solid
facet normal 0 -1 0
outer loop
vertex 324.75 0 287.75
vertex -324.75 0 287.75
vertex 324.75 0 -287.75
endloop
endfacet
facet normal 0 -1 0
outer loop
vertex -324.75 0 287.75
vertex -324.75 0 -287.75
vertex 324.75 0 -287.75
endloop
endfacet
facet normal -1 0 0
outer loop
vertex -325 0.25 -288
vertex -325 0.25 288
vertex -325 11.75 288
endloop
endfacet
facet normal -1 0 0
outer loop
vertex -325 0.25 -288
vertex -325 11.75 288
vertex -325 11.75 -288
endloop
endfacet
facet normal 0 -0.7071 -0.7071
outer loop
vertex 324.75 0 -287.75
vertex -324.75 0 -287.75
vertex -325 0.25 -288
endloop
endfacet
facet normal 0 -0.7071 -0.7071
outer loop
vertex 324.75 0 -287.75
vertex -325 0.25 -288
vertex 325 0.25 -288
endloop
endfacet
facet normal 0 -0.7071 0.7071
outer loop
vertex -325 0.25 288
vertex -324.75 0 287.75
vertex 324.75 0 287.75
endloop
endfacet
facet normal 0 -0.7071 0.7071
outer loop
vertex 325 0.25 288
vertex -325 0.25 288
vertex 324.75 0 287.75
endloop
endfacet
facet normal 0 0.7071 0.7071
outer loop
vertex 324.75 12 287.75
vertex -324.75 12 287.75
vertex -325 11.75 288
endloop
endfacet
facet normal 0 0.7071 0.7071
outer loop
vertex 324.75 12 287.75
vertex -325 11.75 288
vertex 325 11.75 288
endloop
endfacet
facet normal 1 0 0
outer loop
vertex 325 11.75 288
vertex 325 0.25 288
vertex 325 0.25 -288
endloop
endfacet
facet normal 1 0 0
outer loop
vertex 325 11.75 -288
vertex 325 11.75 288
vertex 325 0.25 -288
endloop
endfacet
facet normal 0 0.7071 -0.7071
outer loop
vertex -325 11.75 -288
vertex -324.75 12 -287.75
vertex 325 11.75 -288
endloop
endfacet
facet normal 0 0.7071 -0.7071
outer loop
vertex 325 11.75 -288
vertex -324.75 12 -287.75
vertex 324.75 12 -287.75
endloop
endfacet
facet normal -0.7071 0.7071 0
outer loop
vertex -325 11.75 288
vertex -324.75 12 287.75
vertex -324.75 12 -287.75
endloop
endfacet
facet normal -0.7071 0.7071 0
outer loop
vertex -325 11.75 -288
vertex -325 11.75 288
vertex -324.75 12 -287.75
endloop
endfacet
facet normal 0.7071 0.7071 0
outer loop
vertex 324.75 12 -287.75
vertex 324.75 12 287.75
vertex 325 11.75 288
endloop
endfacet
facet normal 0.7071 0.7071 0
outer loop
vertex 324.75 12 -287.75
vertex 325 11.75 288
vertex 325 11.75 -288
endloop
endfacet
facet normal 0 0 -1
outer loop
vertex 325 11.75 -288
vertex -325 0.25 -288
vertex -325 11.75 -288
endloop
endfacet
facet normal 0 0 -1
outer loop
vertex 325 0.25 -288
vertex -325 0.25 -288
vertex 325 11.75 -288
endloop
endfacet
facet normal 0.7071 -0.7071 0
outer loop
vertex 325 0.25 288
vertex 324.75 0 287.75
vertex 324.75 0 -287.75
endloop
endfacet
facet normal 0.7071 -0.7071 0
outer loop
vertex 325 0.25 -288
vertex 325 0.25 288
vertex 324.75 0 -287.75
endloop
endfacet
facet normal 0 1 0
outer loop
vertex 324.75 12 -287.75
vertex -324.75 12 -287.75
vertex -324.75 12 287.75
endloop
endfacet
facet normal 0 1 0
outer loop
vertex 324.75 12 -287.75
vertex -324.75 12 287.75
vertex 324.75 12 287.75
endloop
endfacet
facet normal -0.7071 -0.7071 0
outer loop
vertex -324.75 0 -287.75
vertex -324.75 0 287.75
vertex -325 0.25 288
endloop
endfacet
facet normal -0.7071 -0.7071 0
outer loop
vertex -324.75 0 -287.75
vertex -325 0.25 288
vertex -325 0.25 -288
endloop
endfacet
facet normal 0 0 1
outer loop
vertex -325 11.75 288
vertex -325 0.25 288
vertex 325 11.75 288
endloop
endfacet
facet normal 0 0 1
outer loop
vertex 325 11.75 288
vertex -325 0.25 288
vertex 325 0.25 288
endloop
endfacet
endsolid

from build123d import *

# Parameters (mm, degrees)
SKETCH1_W           = 650
SKETCH1_H           = 576
BOSS_EXTRUDE1_DEPTH = 12
CHAMFER1_SIZE       = 0.25


with BuildPart() as part:
    # Sketch1 → Boss-Extrude1 (new body)
    with BuildSketch(Plane(origin=(0, 0, 0), x_dir=(1, 0, 0), z_dir=(0, 1, 0))):
        Rectangle(SKETCH1_W, SKETCH1_H)
    extrude(amount=BOSS_EXTRUDE1_DEPTH)

    # Chamfer1
    chamfer1_edges = [part.edges().sort_by_distance(p)[0] for p in [
        (-325, 12, 0),
        (0, 12, 288),
        (325, 12, 0),
        (0, 0, 288),
        (-325, 0, 0),
        (0, 0, -288),
        (325, 0, 0),
        (0, 12, -288),
    ]]
    chamfer(chamfer1_edges, length=CHAMFER1_SIZE)


solid = part.part
